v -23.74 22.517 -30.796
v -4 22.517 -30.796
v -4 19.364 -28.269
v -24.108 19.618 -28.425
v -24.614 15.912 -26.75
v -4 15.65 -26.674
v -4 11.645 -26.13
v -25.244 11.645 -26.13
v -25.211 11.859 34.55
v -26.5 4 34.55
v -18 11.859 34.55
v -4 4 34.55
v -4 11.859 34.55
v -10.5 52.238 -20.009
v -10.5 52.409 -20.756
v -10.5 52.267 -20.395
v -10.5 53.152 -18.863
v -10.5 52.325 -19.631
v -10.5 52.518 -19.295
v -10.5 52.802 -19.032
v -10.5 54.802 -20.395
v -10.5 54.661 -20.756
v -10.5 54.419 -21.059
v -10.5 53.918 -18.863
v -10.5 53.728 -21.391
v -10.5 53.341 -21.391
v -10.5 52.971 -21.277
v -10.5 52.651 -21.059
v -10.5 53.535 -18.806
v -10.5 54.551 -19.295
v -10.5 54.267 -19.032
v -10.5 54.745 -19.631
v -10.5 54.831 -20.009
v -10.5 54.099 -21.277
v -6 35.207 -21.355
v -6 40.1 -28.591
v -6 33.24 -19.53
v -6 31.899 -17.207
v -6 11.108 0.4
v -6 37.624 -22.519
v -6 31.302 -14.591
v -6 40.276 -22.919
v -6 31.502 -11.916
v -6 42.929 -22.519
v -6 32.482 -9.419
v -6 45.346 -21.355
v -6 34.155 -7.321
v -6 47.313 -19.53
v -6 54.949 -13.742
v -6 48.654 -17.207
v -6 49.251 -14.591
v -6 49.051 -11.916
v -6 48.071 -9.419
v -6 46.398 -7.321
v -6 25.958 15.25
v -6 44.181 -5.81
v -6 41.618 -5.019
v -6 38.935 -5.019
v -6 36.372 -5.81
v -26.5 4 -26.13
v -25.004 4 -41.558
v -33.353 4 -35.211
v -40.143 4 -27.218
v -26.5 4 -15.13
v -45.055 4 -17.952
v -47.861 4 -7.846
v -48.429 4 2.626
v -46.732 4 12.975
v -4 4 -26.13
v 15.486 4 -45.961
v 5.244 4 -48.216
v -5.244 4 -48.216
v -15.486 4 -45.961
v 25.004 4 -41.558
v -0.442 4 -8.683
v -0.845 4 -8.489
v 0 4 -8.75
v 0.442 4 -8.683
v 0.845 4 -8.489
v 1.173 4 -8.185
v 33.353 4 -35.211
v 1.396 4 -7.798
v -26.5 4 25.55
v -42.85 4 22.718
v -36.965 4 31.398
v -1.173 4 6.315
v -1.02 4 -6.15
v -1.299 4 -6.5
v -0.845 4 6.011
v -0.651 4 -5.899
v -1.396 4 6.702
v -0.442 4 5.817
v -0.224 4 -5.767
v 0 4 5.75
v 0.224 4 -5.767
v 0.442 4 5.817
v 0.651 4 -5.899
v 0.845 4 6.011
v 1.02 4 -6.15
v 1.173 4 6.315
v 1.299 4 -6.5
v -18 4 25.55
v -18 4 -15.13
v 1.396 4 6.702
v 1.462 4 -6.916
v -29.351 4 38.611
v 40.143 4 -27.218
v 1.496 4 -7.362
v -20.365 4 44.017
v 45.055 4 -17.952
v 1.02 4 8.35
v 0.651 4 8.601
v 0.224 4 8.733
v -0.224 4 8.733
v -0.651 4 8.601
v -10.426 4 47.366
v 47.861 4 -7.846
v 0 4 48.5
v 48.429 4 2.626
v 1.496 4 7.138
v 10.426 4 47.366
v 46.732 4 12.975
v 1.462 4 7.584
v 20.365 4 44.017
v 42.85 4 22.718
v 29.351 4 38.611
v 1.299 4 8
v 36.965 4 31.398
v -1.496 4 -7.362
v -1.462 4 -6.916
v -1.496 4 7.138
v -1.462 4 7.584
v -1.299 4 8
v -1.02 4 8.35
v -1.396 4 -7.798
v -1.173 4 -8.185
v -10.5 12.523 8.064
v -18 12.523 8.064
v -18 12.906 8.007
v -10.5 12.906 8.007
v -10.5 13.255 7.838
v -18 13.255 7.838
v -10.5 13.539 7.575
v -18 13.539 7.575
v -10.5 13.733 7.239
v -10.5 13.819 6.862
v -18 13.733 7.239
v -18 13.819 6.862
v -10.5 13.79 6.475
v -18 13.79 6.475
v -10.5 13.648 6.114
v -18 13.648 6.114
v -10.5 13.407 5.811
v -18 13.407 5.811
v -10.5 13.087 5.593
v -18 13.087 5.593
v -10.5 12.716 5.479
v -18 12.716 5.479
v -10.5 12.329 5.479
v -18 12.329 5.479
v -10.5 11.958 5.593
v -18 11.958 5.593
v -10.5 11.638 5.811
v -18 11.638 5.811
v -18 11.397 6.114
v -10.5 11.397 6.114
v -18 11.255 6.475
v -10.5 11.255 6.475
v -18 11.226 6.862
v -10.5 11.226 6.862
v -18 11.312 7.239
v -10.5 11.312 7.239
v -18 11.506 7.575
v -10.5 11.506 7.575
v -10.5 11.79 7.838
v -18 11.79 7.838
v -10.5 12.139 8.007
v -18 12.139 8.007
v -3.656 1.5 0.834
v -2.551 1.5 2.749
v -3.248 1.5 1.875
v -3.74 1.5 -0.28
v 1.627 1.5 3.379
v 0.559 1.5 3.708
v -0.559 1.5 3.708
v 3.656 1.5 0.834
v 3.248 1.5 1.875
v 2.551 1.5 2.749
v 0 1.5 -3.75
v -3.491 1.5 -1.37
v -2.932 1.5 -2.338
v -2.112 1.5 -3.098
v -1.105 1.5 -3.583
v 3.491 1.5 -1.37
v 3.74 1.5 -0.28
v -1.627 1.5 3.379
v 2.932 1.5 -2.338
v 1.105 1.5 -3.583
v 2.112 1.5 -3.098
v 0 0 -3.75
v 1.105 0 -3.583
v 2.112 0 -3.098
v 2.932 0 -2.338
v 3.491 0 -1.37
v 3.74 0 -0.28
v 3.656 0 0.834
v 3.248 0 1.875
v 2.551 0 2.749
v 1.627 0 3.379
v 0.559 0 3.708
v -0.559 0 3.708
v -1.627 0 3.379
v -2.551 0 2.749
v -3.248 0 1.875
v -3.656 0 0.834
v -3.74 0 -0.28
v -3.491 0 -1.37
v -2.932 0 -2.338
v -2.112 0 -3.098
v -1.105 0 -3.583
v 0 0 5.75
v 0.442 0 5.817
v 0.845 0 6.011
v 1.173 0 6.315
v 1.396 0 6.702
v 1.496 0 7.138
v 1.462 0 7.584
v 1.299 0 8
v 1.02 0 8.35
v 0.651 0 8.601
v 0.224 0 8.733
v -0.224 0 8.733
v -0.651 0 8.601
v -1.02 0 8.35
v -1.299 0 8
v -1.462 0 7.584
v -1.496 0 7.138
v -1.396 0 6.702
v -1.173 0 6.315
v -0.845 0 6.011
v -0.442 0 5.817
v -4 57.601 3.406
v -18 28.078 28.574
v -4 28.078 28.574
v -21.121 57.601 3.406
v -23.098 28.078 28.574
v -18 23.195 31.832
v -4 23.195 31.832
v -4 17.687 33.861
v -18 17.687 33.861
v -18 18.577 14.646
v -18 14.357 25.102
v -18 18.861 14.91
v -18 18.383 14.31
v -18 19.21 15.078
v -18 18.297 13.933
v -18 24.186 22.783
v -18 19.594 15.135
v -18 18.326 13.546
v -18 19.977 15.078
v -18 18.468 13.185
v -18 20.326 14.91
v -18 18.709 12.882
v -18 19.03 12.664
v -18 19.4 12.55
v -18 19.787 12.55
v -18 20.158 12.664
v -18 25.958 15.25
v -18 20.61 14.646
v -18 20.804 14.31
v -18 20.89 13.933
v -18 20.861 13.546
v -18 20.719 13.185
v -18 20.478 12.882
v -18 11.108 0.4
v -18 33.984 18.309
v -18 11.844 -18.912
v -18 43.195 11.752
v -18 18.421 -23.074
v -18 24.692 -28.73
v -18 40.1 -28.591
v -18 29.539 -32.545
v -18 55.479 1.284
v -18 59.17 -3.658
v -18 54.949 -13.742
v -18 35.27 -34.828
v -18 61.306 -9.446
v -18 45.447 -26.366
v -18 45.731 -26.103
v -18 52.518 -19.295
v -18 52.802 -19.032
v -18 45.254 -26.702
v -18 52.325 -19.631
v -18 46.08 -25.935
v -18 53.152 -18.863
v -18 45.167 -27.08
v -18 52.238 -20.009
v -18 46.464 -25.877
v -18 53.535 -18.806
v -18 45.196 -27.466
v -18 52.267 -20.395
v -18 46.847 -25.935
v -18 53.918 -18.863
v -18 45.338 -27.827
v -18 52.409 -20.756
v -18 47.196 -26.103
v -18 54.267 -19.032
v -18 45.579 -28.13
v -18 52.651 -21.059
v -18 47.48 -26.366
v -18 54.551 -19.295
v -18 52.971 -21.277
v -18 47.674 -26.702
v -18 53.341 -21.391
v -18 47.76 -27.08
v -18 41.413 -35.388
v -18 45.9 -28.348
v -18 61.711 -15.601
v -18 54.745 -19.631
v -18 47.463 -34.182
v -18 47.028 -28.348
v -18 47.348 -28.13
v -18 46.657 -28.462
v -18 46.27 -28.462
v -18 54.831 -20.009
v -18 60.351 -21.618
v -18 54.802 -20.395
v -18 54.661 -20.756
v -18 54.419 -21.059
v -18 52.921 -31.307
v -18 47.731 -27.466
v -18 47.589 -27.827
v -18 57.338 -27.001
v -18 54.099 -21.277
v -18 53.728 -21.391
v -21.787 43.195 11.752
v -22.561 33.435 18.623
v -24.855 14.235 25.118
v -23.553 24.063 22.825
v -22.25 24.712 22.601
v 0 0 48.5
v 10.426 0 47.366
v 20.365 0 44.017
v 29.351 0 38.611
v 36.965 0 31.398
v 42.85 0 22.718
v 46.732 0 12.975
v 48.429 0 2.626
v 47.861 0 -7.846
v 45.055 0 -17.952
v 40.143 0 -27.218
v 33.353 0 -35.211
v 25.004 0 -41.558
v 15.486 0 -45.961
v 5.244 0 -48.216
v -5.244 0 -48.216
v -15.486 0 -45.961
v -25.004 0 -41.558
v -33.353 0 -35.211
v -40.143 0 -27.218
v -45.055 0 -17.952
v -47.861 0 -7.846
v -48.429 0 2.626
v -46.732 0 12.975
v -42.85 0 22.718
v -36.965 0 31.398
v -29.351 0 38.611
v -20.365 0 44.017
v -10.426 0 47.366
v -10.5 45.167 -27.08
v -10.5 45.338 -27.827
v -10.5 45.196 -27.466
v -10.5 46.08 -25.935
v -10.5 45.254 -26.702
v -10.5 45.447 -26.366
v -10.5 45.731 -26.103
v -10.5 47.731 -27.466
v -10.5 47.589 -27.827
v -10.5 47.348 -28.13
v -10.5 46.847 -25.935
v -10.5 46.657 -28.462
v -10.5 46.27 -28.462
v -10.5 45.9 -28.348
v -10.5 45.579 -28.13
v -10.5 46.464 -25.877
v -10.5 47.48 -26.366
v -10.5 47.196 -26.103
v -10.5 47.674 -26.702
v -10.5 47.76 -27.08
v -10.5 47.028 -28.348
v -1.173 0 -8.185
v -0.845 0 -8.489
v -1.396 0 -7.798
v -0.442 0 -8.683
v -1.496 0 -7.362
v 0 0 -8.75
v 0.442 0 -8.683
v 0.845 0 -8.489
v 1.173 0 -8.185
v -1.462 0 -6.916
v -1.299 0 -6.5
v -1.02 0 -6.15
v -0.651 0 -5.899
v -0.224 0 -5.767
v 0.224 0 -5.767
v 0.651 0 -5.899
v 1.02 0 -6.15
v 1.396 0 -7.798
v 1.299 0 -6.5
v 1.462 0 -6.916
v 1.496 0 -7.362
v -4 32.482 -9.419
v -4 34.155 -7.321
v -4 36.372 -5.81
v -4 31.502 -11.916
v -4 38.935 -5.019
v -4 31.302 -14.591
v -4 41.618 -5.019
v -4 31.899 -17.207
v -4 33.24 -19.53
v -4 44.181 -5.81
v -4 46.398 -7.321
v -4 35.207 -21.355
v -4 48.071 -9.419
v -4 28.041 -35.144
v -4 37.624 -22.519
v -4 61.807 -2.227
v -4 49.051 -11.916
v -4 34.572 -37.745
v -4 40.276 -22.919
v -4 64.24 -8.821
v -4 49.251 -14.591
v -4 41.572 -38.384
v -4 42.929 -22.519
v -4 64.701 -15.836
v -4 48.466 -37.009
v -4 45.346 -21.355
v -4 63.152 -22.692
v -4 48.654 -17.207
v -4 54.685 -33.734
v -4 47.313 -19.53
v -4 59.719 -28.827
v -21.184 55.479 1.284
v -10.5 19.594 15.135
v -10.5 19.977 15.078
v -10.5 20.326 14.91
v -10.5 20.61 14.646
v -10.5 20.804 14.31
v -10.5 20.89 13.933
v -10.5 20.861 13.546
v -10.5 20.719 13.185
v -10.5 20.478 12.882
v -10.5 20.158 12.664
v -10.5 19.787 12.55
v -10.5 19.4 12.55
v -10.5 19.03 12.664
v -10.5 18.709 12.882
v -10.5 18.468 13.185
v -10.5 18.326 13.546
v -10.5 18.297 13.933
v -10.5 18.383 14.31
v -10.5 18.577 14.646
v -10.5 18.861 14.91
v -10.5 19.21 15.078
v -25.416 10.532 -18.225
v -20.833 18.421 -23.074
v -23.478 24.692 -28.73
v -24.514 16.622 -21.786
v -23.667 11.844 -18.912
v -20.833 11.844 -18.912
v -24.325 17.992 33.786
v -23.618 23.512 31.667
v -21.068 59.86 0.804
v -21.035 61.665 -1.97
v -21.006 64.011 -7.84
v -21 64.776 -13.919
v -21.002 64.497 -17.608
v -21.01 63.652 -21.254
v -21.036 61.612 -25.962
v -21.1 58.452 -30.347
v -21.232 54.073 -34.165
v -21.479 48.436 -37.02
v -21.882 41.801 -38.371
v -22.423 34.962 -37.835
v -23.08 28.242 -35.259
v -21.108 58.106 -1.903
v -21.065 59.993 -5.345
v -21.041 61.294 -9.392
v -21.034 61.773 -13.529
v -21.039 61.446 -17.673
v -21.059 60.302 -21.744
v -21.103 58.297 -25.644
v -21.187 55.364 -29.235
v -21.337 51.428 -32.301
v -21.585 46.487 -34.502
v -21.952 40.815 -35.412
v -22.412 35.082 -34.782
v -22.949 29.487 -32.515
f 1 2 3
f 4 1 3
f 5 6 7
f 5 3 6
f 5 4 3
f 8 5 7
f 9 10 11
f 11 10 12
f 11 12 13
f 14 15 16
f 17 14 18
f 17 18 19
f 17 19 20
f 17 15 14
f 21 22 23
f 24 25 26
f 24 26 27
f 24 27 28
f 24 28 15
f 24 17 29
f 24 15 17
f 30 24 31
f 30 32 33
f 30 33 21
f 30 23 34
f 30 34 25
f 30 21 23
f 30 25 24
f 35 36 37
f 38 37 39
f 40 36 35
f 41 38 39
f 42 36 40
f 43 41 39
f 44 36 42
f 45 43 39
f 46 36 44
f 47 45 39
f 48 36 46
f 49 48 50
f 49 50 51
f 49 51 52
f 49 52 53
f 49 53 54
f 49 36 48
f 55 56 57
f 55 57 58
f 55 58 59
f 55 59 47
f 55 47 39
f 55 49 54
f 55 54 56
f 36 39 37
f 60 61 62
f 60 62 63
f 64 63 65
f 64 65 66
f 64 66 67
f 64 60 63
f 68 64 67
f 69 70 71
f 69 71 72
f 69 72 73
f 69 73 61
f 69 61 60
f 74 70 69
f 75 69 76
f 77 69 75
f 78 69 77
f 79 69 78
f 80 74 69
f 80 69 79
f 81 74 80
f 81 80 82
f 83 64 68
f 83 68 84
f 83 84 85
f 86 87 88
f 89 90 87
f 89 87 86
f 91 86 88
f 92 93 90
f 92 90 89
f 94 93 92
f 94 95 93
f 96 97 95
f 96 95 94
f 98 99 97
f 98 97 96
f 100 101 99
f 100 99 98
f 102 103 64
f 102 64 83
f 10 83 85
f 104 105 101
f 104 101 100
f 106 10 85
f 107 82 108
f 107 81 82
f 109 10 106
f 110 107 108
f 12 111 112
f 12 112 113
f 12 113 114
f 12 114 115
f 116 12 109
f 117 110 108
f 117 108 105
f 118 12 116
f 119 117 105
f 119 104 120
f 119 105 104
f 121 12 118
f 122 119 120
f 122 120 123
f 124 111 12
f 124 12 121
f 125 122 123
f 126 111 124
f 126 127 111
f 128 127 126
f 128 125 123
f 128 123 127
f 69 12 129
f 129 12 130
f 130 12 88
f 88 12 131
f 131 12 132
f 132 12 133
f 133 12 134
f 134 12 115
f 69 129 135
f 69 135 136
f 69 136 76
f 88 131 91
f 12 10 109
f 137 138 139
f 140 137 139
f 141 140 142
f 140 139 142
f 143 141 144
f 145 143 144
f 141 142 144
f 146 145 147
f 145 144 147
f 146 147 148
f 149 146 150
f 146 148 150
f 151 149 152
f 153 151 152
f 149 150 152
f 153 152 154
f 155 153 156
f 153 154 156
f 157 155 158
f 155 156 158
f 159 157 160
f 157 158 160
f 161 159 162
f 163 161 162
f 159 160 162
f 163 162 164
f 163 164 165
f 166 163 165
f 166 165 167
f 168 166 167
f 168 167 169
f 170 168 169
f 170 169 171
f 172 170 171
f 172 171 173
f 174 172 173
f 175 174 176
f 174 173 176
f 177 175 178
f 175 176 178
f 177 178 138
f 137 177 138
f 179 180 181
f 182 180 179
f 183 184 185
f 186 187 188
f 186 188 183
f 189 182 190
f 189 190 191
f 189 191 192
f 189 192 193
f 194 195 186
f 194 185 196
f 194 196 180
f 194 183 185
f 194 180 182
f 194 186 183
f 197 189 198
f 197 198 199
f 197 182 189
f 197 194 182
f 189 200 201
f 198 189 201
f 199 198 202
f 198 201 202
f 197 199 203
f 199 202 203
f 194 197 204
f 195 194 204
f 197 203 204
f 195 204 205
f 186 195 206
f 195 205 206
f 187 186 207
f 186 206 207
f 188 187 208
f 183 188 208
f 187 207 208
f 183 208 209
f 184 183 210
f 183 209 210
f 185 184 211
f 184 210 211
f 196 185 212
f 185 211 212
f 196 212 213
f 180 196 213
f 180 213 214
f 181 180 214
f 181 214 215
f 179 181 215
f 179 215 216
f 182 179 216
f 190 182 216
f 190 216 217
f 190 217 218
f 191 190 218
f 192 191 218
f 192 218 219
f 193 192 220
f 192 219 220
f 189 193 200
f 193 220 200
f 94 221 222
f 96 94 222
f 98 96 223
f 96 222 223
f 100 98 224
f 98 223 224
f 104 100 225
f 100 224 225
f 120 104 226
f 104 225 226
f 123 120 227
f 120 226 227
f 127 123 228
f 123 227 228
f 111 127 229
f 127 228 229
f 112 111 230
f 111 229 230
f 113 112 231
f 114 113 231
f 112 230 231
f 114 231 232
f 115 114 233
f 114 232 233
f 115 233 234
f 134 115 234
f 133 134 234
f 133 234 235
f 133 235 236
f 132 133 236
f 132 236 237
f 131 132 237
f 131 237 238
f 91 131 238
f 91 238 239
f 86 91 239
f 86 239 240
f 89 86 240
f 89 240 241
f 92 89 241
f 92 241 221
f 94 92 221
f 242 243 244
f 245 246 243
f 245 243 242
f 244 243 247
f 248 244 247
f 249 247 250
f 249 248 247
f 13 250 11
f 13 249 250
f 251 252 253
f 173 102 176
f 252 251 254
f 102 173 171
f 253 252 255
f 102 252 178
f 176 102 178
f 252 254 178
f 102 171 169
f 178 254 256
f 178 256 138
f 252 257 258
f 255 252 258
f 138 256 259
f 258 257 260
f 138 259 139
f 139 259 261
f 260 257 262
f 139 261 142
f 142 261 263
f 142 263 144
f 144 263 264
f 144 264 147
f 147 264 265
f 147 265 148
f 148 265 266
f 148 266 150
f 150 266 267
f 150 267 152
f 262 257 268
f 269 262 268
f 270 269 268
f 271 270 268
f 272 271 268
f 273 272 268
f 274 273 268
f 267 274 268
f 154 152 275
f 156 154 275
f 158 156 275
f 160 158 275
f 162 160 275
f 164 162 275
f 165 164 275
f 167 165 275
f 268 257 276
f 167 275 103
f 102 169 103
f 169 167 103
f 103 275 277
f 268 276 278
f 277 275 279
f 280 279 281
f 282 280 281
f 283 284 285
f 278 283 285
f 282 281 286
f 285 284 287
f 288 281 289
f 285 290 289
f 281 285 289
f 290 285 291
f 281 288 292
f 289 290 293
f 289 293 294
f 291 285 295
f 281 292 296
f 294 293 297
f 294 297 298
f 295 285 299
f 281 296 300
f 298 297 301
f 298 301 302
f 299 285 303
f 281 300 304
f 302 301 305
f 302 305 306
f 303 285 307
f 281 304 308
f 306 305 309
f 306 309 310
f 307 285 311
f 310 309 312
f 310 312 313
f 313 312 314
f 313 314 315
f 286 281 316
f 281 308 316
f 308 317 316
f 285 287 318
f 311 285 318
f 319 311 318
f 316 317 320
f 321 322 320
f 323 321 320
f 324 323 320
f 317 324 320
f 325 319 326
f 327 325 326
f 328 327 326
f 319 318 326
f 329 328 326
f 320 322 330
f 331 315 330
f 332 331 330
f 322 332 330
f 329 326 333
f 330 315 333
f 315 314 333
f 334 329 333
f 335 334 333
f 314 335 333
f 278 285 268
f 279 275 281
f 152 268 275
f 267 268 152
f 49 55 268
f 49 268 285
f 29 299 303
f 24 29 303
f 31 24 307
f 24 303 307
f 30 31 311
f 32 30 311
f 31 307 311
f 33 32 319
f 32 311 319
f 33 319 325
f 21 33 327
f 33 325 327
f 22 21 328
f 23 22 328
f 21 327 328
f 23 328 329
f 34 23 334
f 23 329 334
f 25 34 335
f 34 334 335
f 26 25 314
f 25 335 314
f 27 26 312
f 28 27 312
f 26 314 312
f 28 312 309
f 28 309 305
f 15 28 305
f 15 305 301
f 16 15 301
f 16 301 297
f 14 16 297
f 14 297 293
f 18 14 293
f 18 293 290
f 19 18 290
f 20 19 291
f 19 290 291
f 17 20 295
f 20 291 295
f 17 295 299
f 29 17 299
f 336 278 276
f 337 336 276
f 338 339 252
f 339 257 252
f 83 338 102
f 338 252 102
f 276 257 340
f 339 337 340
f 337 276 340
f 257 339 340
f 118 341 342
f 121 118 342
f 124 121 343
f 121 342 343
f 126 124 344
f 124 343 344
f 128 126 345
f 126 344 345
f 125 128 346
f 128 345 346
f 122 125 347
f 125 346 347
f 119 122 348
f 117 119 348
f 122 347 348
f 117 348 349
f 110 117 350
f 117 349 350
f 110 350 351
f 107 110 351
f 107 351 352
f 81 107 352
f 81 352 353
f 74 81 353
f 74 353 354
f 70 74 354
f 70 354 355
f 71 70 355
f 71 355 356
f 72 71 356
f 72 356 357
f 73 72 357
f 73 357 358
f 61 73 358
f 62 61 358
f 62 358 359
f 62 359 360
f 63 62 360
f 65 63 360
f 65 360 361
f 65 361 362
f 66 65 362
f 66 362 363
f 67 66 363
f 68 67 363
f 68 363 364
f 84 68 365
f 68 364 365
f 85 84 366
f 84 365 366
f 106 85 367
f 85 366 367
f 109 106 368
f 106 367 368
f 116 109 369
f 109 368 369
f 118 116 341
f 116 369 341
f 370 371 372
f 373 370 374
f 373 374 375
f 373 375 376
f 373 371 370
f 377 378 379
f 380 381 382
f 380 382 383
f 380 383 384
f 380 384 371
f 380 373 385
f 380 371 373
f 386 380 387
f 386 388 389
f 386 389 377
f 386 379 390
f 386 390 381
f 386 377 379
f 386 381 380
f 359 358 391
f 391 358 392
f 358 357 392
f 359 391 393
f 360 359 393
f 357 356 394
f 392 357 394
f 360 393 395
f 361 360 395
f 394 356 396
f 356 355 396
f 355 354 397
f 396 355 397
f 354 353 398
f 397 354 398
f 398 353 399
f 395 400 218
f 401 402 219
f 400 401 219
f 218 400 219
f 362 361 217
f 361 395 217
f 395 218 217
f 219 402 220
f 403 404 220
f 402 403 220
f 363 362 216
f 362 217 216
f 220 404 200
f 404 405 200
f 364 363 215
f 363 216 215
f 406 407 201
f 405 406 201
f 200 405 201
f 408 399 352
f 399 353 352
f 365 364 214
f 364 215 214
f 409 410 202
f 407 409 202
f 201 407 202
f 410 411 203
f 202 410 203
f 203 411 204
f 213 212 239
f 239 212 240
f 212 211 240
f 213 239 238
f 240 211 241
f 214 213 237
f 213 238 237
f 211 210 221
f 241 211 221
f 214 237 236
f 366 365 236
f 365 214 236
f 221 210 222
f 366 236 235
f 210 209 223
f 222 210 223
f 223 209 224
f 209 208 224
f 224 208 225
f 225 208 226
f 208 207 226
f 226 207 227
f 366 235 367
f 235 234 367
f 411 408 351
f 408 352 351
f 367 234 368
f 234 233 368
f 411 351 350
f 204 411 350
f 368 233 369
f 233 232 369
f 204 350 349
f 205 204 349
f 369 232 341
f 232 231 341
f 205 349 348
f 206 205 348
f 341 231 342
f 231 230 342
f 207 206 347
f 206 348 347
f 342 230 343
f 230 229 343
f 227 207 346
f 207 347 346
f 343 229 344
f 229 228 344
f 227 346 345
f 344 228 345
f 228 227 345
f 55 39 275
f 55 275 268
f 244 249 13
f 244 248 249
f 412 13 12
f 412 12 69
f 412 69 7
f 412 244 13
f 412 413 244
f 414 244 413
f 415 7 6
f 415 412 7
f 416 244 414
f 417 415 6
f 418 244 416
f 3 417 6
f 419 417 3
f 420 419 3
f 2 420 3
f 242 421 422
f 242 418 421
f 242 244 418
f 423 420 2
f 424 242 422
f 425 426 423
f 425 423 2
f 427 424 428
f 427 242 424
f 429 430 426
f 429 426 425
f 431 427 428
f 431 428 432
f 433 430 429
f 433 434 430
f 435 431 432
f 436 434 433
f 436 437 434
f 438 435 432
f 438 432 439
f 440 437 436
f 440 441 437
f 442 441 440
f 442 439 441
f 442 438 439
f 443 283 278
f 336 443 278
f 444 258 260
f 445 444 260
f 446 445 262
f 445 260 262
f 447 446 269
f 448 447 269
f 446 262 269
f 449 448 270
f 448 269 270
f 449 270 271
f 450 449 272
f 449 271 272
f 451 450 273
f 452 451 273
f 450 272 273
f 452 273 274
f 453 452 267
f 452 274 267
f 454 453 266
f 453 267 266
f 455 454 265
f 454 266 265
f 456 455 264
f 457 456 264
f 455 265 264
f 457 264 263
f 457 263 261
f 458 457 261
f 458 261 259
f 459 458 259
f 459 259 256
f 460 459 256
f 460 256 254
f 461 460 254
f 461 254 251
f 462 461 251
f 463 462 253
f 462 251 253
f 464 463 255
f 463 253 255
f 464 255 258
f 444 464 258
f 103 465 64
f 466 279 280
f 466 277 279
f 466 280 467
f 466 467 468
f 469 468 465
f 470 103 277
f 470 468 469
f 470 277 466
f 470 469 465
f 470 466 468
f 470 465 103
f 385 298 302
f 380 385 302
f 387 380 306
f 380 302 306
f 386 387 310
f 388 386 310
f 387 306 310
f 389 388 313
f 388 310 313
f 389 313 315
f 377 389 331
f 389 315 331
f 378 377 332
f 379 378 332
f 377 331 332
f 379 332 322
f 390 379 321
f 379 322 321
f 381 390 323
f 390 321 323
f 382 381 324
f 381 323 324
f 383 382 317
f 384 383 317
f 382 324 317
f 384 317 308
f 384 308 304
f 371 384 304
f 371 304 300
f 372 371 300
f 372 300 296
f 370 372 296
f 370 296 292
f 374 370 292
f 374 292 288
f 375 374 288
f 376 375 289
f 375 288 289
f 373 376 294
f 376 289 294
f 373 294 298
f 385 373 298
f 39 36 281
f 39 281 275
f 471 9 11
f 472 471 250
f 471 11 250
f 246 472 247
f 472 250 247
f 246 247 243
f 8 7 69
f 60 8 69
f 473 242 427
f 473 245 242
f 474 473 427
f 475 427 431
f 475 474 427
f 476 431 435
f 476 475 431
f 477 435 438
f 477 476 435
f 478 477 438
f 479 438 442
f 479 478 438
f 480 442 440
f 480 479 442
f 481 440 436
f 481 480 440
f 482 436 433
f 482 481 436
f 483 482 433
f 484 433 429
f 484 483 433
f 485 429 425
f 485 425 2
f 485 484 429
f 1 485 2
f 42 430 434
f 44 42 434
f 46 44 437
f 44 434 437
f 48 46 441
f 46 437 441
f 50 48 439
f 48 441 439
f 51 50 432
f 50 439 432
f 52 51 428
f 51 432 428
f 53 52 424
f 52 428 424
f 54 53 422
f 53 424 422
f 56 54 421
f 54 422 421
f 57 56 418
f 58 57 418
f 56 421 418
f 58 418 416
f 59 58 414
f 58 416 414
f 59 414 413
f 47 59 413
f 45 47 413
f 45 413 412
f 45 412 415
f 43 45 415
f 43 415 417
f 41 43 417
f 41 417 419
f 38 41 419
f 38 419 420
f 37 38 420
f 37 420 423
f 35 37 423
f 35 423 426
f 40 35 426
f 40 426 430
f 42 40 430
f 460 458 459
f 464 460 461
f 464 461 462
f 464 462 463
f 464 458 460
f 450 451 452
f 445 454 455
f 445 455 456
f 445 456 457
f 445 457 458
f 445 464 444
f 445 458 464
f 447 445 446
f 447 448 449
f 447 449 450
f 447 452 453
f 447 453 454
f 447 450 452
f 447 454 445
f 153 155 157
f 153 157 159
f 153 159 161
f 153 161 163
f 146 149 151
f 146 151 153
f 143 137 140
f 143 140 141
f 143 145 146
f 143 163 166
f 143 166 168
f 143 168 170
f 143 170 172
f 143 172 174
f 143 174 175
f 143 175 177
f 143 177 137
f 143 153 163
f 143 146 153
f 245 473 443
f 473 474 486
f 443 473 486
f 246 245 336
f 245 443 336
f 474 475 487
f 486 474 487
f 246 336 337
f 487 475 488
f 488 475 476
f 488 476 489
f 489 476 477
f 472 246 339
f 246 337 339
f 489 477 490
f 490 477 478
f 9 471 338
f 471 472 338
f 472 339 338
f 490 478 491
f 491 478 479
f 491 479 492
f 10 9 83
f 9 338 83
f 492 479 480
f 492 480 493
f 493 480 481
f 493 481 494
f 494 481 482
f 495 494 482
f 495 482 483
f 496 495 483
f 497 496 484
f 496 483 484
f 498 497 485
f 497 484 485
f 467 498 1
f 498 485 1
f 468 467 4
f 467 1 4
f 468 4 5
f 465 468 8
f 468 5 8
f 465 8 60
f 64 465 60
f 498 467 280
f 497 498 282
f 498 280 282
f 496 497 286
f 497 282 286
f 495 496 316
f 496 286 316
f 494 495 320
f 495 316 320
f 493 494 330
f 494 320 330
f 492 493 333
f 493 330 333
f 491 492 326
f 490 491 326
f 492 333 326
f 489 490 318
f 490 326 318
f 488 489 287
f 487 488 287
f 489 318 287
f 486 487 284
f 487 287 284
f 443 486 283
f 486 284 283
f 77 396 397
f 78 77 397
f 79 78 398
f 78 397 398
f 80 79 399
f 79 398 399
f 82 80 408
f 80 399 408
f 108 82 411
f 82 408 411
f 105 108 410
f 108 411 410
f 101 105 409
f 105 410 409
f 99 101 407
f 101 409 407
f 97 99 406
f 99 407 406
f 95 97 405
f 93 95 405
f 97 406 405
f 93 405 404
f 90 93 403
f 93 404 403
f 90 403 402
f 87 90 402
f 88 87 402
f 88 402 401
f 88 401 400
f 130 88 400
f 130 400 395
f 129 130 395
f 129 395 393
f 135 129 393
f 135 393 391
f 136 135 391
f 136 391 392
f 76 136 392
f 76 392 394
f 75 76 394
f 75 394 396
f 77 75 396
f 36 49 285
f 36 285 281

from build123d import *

# Parameters (mm, degrees)
SKETCH2_R                       = 48.5
BOSS_EXTRUDE1_DEPTH             = 4
SKETCH4_R                       = 1.5
CUT_EXTRUDE2_DEPTH              = 69.705894944
SKETCH5_R                       = 3.75
CUT_EXTRUDE3_DEPTH              = 1.5
BOSS_EXTRUDE2_DEPTH             = 14
CUT_EXTRUDE5_REACH              = 97.597
SKETCH9_R                       = 1.3
CUT_EXTRUDE6_DEPTH              = 7.5
CUT_EXTRUDE9_REACH              = 96.471
SKETCH11_R                      = 9
BOSS_EXTRUDE7_DEPTH             = 9
BOSS_EXTRUDE7_DIRECTION_2_REACH = 104.912
BOSS_EXTRUDE10_DEPTH            = 9
CUT_EXTRUDE17_DEPTH             = 95.342420983
CUT_EXTRUDE17_DEPTH_BACK        = 95.342420983


with BuildPart() as part:
    # Sketch2 → Boss-Extrude1 (new body)
    with BuildSketch(Plane(origin=(0, 0, 0), x_dir=(1, 0, 0), z_dir=(0, 1, 0))):
        with Locations(Location((0, 0, 0), (0, 0, 270))):
            Circle(SKETCH2_R)
    extrude(amount=BOSS_EXTRUDE1_DEPTH)

    # Sketch4 → Cut-Extrude2 (cut, through all)
    with BuildSketch(Plane.XZ):
        with Locations(Location((0, 7.25, 0), (0, 0, 270))):
            Circle(SKETCH4_R)
        with Locations(Location((0, -7.25, 0), (0, 0, 270))):
            Circle(SKETCH4_R)
    extrude(amount=-CUT_EXTRUDE2_DEPTH, mode=Mode.SUBTRACT)

    # Sketch5 → Cut-Extrude3 (cut)
    with BuildSketch(Plane.XZ):
        with Locations(Location((0, 0, 0), (0, 0, 270))):
            Circle(SKETCH5_R)
    extrude(amount=-CUT_EXTRUDE3_DEPTH, mode=Mode.SUBTRACT)

    # Sketch7 → Boss-Extrude2 (add)
    with BuildSketch(Plane(origin=(-4, 0, 0), x_dir=(0, 0, -1), z_dir=(1, 0, 0))):
        with BuildLine():
            Line((23.129947874, 4), (23.129947874, 11.644549616))
            ThreePointArc((23.129947874, 11.644549616), (24.589048403, 18.743749901), (28.729797284, 24.692011643))
            ThreePointArc((28.729797284, 24.692011643), (29.313383054, 55.284736897), (-1.284289494, 55.479275971))
            Line((-1.284289494, 55.479275971), (-27.227315747, 29.536249718))
            ThreePointArc((-27.227315747, 29.536249718), (-32.64663453, 21.425665997), (-34.549646217, 11.858580188))
            Line((-34.549646217, 11.858580188), (-34.549646217, 4))
            Line((-34.549646217, 4), (23.129947874, 4))
        make_face()
    extrude(amount=-BOSS_EXTRUDE2_DEPTH)

    # Sketch8 → Cut-Extrude5 (cut, up to next)
    with BuildSketch(Plane(origin=(-6, 0, 0), x_dir=(0, 0, -1), z_dir=(1, 0, 0)), mode=Mode.PRIVATE) as cut_extrude5_sk1:
        Polygon((-15.249648422, 25.957567857), (13.741729607, 54.948945886), (28.590972012, 40.099703481), (-0.400406017, 11.108325452), align=None)
    cut_extrude5_tool1 = extrude(cut_extrude5_sk1.sketch, amount=-CUT_EXTRUDE5_REACH, mode=Mode.PRIVATE) & part.part
    add(cut_extrude5_tool1.solids().sort_by_distance((-6, 33.028636, -6.670662))[0], mode=Mode.SUBTRACT)

    # Sketch9 → Cut-Extrude6 (cut)
    with BuildSketch(Plane.ZY.offset(18)):
        with Locations((-20.105690637, 53.534732323)):
            Circle(SKETCH9_R)
        with Locations((-27.176758449, 46.463664511)):
            Circle(SKETCH9_R)
        with Locations((6.764367048, 12.522539014)):
            Circle(SKETCH9_R)
        with Locations((13.83543486, 19.593606826)):
            Circle(SKETCH9_R)
    extrude(amount=-CUT_EXTRUDE6_DEPTH, mode=Mode.SUBTRACT)

    # Sketch11 → Cut-Extrude9 (cut, up to next)
    with BuildSketch(Plane(origin=(-4, 0, 0), x_dir=(0, 0, -1), z_dir=(1, 0, 0)), mode=Mode.PRIVATE) as cut_extrude9_sk1:
        with Locations((13.918506302, 40.276480176)):
            Circle(SKETCH11_R)
    cut_extrude9_tool1 = extrude(cut_extrude9_sk1.sketch, amount=-CUT_EXTRUDE9_REACH, mode=Mode.PRIVATE) & part.part
    add(cut_extrude9_tool1.solids().sort_by_distance((-4, 40.27648, -13.918506))[0], mode=Mode.SUBTRACT)

    # Sketch17 → Boss-Extrude7 (add)
    with BuildSketch(Plane.ZY.offset(18)):
        with BuildLine():
            ThreePointArc((34.549646217, 11.858580188), (33.008342843, 20.500891953), (28.574482006, 28.077569775))
            ThreePointArc((28.574482006, 28.077569775), (27.915386359, 28.820289685), (27.227315747, 29.536249718))
            Line((27.227315747, 29.536249718), (1.284289494, 55.479275971))
            Line((1.284289494, 55.479275971), (26.295003593, 26.127182305))
            ThreePointArc((26.295003593, 26.127182305), (30.194232218, 19.461281607), (31.549646217, 11.858580188))
            Line((31.549646217, 11.858580188), (31.549646217, 4))
            Line((31.549646217, 4), (34.549646217, 4))
            Line((34.549646217, 4), (34.549646217, 11.858580188))
        make_face()
        with BuildLine():
            Line((28.574482006, 28.077569775), (3.405609837, 57.600596315))
            ThreePointArc((3.405609837, 57.600596315), (-31.461505391, 57.378912253), (-30.796489049, 22.517434639))
            ThreePointArc((-30.796489049, 22.517434639), (-27.345864981, 17.560549854), (-26.129947874, 11.644549616))
            Line((-26.129947874, 11.644549616), (-26.129947874, 4))
            Line((-26.129947874, 4), (-23.129947874, 4))
            Line((-23.129947874, 4), (-23.129947874, 11.644549616))
            ThreePointArc((-23.129947874, 11.644549616), (-24.589048403, 18.743749901), (-28.729797284, 24.692011643))
            ThreePointArc((-28.729797284, 24.692011643), (-29.313383054, 55.284736897), (1.284289494, 55.479275971))
            Line((1.284289494, 55.479275971), (27.227315747, 29.536249718))
            ThreePointArc((27.227315747, 29.536249718), (27.915386359, 28.820289685), (28.574482006, 28.077569775))
        make_face()
    extrude(amount=BOSS_EXTRUDE7_DEPTH)

    # Boss-Extrude7 direction 2: up to this face of the body (flat: up to its plane)
    boss_extrude7_direction_2_end = Plane(part.part.faces().sort_by_distance((-4, 28.276431801, -1.649713195))[0])
    # Sketch17 → Boss-Extrude7 direction 2 (add, up to the picked face)
    with BuildSketch(Plane.ZY.offset(18), mode=Mode.PRIVATE) as boss_extrude7_direction_2_sk1:
        with BuildLine():
            ThreePointArc((34.549646217, 11.858580188), (33.008342843, 20.500891953), (28.574482006, 28.077569775))
            ThreePointArc((28.574482006, 28.077569775), (27.915386359, 28.820289685), (27.227315747, 29.536249718))
            Line((27.227315747, 29.536249718), (1.284289494, 55.479275971))
            Line((1.284289494, 55.479275971), (26.295003593, 26.127182305))
            ThreePointArc((26.295003593, 26.127182305), (30.194232218, 19.461281607), (31.549646217, 11.858580188))
            Line((31.549646217, 11.858580188), (31.549646217, 4))
            Line((31.549646217, 4), (34.549646217, 4))
            Line((34.549646217, 4), (34.549646217, 11.858580188))
        make_face()
    boss_extrude7_direction_2_tool1 = split(extrude(boss_extrude7_direction_2_sk1.sketch, amount=-BOSS_EXTRUDE7_DIRECTION_2_REACH, mode=Mode.PRIVATE), bisect_by=boss_extrude7_direction_2_end, keep=Keep.BOTH, mode=Mode.PRIVATE)
    # Sketch17 → Boss-Extrude7 direction 2 (add, up to the picked face)
    with BuildSketch(Plane.ZY.offset(18), mode=Mode.PRIVATE) as boss_extrude7_direction_2_sk2:
        with BuildLine():
            Line((28.574482006, 28.077569775), (3.405609837, 57.600596315))
            ThreePointArc((3.405609837, 57.600596315), (-31.461505391, 57.378912253), (-30.796489049, 22.517434639))
            ThreePointArc((-30.796489049, 22.517434639), (-27.345864981, 17.560549854), (-26.129947874, 11.644549616))
            Line((-26.129947874, 11.644549616), (-26.129947874, 4))
            Line((-26.129947874, 4), (-23.129947874, 4))
            Line((-23.129947874, 4), (-23.129947874, 11.644549616))
            ThreePointArc((-23.129947874, 11.644549616), (-24.589048403, 18.743749901), (-28.729797284, 24.692011643))
            ThreePointArc((-28.729797284, 24.692011643), (-29.313383054, 55.284736897), (1.284289494, 55.479275971))
            Line((1.284289494, 55.479275971), (27.227315747, 29.536249718))
            ThreePointArc((27.227315747, 29.536249718), (27.915386359, 28.820289685), (28.574482006, 28.077569775))
        make_face()
    boss_extrude7_direction_2_tool2 = split(extrude(boss_extrude7_direction_2_sk2.sketch, amount=-BOSS_EXTRUDE7_DIRECTION_2_REACH, mode=Mode.PRIVATE), bisect_by=boss_extrude7_direction_2_end, keep=Keep.BOTH, mode=Mode.PRIVATE)
    add(boss_extrude7_direction_2_tool1.solids().sort_by(Axis((-18, 4.612919, 33.049646), (1, 0, 0)))[0])
    add(boss_extrude7_direction_2_tool2.solids().sort_by(Axis((-18, 43.147366, 14.895406), (1, 0, 0)))[0])

    # Sketch25 → Boss-Extrude10 (add)
    with BuildSketch(Plane.ZY.offset(18)):
        with BuildLine():
            ThreePointArc((-28.729797284, 24.692011643), (-24.589048403, 18.743749901), (-23.129947874, 11.644549616))
            Line((-23.129947874, 11.644549616), (-23.129947874, 4))
            Line((-23.129947874, 4), (-15.129947874, 4))
            add(Edge.make_bspline(
                [(-28.729797284, 24.692011643), (-21.954867515, 18.253200081), (-19.09405247, 12.798017691), (-15.129947874, 4)],
                knots=[0, 0, 0, 0, 1, 1, 1, 1], degree=3))
        make_face()
        with BuildLine():
            add(Edge.make_bspline(
                [(11.751619577, 43.19501844), (26.551255916, 25.8264495), (25.549646217, 4)],
                knots=[0, 0, 0, 1, 1, 1], degree=2))
            Line((25.549646217, 4), (31.549646217, 4))
            Line((31.549646217, 4), (31.549646217, 11.858580188))
            ThreePointArc((31.549646217, 11.858580188), (30.194232218, 19.461281607), (26.295003593, 26.127182305))
            Line((26.295003593, 26.127182305), (11.751619577, 43.19501844))
        make_face()
    extrude(amount=BOSS_EXTRUDE10_DEPTH)

    # Sketch29 → Cut-Extrude17 (cut, two sides: drawn at the far end of the back side and taken through both)
    with BuildSketch(Plane.XY.offset(-CUT_EXTRUDE17_DEPTH_BACK)):
        with BuildLine():
            Line((-21, 64.776480176), (-27, 64.776480176))
            Line((-27, 64.776480176), (-27, 4))
            Line((-27, 4), (-26.5, 4))
            add(Edge.make_bspline(
                [(-21, 64.776480176), (-21.220459696, 34.140901434), (-26.5, 4)],
                knots=[0, 0, 0, 1, 1, 1], degree=2))
        make_face()
    extrude(amount=CUT_EXTRUDE17_DEPTH + CUT_EXTRUDE17_DEPTH_BACK, mode=Mode.SUBTRACT)


solid = part.part
